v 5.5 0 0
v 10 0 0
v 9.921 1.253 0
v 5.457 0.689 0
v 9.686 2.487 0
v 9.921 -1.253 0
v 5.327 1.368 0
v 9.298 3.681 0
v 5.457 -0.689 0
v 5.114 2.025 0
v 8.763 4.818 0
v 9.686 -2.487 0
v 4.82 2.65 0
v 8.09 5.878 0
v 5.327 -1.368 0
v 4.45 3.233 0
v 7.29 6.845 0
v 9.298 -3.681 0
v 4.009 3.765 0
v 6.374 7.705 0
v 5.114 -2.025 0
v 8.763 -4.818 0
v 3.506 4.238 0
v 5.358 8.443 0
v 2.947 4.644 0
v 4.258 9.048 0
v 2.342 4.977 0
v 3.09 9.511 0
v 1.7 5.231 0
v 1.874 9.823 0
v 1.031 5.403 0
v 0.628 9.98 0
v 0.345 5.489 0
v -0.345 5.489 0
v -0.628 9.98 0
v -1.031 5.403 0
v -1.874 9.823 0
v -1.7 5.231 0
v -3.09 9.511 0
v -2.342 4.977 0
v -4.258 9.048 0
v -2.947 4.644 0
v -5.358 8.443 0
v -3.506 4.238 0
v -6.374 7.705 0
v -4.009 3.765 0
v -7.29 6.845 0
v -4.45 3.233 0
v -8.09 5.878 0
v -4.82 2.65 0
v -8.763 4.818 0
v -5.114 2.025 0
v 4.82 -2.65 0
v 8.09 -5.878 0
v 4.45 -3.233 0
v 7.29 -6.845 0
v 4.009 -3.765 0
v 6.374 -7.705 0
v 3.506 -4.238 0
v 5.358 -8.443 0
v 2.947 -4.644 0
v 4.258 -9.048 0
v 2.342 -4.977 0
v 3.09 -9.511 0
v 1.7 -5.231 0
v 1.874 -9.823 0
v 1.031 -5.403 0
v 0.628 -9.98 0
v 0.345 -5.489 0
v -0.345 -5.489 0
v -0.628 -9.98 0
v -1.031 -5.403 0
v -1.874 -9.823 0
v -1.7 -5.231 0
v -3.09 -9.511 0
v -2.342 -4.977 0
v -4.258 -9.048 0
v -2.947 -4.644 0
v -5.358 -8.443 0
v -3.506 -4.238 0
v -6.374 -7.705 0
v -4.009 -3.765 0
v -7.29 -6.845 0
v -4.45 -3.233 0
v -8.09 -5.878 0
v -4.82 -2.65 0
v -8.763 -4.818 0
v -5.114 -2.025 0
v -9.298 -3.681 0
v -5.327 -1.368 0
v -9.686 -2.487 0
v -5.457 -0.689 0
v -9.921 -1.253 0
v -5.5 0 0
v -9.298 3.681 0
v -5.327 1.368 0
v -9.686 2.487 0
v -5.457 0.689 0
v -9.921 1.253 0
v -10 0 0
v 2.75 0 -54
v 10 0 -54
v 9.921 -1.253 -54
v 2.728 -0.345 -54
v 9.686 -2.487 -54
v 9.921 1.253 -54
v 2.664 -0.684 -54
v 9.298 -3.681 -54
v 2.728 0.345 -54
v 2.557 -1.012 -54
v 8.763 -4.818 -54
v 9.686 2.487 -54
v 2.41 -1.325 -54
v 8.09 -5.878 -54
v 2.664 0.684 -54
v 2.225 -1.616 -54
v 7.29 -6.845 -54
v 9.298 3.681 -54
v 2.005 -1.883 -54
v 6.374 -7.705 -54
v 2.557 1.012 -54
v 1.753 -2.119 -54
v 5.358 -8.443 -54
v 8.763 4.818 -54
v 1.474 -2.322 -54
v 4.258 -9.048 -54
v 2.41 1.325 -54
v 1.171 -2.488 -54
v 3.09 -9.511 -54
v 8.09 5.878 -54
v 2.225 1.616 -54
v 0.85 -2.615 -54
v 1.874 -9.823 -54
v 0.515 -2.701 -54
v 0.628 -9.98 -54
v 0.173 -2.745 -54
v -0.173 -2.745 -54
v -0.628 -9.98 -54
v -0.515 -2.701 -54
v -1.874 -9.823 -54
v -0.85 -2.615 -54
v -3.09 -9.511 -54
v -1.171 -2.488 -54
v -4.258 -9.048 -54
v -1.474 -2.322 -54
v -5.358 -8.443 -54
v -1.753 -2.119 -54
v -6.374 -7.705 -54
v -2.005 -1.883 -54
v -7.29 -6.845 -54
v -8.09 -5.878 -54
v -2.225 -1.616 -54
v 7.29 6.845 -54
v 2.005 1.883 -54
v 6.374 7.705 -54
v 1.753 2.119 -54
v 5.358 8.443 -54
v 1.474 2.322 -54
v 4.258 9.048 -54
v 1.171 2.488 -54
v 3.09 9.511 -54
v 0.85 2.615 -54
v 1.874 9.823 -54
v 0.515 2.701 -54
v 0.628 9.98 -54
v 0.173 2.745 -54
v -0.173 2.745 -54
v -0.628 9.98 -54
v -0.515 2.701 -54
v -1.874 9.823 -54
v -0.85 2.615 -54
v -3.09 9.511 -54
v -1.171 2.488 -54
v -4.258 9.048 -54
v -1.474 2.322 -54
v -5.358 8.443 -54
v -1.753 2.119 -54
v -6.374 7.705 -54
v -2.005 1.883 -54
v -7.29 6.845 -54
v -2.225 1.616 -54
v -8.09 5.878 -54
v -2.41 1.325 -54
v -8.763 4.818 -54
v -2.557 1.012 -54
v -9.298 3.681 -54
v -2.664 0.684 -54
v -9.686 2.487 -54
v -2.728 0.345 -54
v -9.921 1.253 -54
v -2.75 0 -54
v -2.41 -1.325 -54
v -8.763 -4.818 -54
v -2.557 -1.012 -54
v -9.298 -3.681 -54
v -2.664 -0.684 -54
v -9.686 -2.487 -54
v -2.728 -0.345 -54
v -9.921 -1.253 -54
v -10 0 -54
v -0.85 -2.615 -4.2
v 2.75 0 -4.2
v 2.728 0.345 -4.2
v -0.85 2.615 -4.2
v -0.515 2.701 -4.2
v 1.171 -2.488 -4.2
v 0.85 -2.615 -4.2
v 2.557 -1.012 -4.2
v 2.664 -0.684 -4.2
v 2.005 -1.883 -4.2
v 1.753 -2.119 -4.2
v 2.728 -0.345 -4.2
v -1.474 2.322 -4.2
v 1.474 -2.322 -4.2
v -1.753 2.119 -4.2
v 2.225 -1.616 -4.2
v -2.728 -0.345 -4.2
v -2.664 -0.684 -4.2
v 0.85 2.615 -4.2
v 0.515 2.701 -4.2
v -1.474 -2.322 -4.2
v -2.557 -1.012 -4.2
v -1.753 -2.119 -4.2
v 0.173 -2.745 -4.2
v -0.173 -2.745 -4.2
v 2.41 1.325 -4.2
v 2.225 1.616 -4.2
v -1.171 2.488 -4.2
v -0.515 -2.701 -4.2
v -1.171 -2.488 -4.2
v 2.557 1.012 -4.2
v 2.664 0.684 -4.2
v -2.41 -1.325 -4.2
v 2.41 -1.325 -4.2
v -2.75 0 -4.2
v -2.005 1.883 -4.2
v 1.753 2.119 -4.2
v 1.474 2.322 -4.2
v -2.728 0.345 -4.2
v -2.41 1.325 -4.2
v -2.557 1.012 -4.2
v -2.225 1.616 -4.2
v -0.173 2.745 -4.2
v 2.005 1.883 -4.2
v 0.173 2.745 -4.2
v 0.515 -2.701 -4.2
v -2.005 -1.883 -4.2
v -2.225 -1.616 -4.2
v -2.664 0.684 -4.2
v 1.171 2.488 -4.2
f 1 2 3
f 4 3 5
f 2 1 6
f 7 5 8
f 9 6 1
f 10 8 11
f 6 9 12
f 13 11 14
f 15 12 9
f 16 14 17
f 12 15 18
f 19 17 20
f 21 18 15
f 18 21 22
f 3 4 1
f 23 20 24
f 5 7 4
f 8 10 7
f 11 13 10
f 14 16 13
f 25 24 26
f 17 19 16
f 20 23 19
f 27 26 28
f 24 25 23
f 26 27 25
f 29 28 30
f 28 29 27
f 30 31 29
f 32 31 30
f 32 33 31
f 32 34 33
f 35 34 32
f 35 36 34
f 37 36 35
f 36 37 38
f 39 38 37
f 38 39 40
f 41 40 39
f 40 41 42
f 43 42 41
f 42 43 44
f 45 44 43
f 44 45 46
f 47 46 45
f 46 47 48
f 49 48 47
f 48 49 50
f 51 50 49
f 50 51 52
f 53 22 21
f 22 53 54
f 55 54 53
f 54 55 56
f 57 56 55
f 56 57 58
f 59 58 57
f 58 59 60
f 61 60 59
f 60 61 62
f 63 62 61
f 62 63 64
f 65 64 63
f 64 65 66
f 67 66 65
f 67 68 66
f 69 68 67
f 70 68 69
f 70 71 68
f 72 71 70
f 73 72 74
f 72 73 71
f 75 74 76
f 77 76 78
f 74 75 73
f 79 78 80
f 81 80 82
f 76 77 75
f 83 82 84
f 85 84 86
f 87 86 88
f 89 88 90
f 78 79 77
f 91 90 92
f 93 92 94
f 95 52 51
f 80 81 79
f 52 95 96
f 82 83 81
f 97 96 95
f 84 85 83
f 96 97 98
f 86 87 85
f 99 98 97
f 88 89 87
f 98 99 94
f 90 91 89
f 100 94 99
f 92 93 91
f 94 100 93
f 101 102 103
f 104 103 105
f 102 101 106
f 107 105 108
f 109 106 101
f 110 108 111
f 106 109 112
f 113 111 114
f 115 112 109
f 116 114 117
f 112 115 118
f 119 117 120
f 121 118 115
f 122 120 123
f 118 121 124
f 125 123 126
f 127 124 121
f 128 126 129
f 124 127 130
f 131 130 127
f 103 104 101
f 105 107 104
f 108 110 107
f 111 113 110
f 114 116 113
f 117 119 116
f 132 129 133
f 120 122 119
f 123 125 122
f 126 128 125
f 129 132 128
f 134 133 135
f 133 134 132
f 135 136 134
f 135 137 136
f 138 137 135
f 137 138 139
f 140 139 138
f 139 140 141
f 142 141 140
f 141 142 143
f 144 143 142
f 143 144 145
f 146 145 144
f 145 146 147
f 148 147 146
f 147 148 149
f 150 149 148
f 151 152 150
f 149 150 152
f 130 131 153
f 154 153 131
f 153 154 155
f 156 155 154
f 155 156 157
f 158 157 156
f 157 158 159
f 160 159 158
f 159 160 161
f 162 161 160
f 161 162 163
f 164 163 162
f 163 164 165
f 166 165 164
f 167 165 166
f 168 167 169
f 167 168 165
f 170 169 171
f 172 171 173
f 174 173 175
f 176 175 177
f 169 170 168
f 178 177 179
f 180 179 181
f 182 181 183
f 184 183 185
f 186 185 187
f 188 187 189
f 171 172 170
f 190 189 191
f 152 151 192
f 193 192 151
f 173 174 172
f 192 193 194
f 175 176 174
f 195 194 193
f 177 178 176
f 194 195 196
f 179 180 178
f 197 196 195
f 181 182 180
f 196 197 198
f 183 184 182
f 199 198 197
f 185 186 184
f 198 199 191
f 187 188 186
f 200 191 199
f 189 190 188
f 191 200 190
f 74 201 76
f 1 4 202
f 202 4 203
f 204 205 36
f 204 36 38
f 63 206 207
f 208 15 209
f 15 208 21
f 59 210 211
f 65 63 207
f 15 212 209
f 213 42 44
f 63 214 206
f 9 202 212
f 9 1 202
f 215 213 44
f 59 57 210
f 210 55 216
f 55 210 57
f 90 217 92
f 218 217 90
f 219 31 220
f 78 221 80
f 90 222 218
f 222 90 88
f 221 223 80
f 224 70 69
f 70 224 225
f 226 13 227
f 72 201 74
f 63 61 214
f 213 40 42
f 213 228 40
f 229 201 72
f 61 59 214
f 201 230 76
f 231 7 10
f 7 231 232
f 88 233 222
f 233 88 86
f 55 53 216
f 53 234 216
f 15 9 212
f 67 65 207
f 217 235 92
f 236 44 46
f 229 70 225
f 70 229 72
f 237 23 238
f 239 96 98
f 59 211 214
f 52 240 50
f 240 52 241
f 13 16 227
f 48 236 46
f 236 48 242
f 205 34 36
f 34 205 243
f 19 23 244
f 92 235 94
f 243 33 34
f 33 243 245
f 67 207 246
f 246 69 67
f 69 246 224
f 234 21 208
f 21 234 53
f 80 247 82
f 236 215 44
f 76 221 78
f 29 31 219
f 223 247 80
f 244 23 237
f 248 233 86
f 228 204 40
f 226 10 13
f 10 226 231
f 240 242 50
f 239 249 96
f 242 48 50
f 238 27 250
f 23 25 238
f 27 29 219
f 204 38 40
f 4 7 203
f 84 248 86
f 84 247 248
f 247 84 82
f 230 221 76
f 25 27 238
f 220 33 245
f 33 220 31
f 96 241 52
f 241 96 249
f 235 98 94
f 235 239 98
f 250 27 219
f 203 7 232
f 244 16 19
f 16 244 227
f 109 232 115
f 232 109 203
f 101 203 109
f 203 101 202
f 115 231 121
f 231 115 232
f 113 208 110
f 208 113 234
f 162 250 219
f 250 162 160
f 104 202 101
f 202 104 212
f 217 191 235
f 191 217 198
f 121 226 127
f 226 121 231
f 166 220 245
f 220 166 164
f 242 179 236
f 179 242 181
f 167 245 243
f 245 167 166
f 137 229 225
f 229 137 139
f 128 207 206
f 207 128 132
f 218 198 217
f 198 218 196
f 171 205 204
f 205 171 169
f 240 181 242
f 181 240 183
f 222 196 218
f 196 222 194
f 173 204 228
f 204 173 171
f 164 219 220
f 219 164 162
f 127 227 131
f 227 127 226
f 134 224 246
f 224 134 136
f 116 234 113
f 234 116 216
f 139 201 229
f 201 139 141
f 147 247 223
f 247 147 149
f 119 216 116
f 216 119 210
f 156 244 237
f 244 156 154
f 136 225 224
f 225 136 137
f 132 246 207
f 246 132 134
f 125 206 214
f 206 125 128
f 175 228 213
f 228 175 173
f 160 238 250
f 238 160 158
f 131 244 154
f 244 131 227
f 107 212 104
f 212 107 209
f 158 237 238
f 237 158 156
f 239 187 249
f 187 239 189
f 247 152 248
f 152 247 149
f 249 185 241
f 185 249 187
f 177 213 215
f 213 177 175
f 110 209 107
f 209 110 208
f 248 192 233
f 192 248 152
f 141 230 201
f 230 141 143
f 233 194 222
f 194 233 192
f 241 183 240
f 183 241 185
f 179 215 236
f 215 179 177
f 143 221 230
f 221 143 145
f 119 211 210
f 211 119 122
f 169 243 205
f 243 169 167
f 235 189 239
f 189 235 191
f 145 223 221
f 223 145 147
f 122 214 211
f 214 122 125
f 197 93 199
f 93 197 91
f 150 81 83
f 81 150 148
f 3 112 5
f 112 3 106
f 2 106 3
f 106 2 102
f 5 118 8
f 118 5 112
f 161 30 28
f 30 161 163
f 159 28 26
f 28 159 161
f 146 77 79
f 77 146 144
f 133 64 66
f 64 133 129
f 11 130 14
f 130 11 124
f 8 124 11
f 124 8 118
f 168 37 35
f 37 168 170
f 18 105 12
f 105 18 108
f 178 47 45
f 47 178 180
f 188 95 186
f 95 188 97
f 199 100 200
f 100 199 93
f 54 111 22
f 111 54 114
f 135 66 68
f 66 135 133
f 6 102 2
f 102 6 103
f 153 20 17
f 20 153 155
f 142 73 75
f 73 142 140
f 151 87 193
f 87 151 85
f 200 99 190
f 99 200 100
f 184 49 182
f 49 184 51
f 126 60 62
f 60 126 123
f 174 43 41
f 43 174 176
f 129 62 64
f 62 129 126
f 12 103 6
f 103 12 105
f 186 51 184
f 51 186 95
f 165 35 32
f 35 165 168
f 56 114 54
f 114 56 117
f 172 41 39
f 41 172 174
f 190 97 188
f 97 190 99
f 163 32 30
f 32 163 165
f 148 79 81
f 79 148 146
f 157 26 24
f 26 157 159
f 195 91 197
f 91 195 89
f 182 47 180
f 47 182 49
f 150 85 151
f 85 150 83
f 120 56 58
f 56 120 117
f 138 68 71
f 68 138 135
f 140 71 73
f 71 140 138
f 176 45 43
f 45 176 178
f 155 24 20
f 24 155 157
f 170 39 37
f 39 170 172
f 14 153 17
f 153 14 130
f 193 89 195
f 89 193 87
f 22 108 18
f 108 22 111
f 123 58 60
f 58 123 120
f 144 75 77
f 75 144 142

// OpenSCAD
$fn = 50;


difference() {
	union() {
		translate(v = [0, 0, -54.0000000000]) {
			cylinder(h = 54, r = 10.0000000000);
		}
		cylinder(h = 0, r = 16.0000000000);
	}
	union() {
		translate(v = [0, 0, 0]) {
			rotate(a = [0, 0, 0]) {
				difference() {
					union() {
						#translate(v = [0, 0, -54.0000000000]) {
							cylinder(h = 54, r = 2.2500000000);
						}
						#translate(v = [0, 0, -4.2000000000]) {
							cylinder(h = 4.2000000000, r = 10.0000000000, r1 = 2.7500000000, r2 = 5.5000000000);
						}
						#translate(v = [0, 0, -54.0000000000]) {
							cylinder(h = 54, r = 2.7500000000);
						}
						#translate(v = [0, 0, -54.0000000000]) {
							cylinder(h = 54, r = 2.2500000000);
						}
					}
					union();
				}
			}
		}
	}
}
